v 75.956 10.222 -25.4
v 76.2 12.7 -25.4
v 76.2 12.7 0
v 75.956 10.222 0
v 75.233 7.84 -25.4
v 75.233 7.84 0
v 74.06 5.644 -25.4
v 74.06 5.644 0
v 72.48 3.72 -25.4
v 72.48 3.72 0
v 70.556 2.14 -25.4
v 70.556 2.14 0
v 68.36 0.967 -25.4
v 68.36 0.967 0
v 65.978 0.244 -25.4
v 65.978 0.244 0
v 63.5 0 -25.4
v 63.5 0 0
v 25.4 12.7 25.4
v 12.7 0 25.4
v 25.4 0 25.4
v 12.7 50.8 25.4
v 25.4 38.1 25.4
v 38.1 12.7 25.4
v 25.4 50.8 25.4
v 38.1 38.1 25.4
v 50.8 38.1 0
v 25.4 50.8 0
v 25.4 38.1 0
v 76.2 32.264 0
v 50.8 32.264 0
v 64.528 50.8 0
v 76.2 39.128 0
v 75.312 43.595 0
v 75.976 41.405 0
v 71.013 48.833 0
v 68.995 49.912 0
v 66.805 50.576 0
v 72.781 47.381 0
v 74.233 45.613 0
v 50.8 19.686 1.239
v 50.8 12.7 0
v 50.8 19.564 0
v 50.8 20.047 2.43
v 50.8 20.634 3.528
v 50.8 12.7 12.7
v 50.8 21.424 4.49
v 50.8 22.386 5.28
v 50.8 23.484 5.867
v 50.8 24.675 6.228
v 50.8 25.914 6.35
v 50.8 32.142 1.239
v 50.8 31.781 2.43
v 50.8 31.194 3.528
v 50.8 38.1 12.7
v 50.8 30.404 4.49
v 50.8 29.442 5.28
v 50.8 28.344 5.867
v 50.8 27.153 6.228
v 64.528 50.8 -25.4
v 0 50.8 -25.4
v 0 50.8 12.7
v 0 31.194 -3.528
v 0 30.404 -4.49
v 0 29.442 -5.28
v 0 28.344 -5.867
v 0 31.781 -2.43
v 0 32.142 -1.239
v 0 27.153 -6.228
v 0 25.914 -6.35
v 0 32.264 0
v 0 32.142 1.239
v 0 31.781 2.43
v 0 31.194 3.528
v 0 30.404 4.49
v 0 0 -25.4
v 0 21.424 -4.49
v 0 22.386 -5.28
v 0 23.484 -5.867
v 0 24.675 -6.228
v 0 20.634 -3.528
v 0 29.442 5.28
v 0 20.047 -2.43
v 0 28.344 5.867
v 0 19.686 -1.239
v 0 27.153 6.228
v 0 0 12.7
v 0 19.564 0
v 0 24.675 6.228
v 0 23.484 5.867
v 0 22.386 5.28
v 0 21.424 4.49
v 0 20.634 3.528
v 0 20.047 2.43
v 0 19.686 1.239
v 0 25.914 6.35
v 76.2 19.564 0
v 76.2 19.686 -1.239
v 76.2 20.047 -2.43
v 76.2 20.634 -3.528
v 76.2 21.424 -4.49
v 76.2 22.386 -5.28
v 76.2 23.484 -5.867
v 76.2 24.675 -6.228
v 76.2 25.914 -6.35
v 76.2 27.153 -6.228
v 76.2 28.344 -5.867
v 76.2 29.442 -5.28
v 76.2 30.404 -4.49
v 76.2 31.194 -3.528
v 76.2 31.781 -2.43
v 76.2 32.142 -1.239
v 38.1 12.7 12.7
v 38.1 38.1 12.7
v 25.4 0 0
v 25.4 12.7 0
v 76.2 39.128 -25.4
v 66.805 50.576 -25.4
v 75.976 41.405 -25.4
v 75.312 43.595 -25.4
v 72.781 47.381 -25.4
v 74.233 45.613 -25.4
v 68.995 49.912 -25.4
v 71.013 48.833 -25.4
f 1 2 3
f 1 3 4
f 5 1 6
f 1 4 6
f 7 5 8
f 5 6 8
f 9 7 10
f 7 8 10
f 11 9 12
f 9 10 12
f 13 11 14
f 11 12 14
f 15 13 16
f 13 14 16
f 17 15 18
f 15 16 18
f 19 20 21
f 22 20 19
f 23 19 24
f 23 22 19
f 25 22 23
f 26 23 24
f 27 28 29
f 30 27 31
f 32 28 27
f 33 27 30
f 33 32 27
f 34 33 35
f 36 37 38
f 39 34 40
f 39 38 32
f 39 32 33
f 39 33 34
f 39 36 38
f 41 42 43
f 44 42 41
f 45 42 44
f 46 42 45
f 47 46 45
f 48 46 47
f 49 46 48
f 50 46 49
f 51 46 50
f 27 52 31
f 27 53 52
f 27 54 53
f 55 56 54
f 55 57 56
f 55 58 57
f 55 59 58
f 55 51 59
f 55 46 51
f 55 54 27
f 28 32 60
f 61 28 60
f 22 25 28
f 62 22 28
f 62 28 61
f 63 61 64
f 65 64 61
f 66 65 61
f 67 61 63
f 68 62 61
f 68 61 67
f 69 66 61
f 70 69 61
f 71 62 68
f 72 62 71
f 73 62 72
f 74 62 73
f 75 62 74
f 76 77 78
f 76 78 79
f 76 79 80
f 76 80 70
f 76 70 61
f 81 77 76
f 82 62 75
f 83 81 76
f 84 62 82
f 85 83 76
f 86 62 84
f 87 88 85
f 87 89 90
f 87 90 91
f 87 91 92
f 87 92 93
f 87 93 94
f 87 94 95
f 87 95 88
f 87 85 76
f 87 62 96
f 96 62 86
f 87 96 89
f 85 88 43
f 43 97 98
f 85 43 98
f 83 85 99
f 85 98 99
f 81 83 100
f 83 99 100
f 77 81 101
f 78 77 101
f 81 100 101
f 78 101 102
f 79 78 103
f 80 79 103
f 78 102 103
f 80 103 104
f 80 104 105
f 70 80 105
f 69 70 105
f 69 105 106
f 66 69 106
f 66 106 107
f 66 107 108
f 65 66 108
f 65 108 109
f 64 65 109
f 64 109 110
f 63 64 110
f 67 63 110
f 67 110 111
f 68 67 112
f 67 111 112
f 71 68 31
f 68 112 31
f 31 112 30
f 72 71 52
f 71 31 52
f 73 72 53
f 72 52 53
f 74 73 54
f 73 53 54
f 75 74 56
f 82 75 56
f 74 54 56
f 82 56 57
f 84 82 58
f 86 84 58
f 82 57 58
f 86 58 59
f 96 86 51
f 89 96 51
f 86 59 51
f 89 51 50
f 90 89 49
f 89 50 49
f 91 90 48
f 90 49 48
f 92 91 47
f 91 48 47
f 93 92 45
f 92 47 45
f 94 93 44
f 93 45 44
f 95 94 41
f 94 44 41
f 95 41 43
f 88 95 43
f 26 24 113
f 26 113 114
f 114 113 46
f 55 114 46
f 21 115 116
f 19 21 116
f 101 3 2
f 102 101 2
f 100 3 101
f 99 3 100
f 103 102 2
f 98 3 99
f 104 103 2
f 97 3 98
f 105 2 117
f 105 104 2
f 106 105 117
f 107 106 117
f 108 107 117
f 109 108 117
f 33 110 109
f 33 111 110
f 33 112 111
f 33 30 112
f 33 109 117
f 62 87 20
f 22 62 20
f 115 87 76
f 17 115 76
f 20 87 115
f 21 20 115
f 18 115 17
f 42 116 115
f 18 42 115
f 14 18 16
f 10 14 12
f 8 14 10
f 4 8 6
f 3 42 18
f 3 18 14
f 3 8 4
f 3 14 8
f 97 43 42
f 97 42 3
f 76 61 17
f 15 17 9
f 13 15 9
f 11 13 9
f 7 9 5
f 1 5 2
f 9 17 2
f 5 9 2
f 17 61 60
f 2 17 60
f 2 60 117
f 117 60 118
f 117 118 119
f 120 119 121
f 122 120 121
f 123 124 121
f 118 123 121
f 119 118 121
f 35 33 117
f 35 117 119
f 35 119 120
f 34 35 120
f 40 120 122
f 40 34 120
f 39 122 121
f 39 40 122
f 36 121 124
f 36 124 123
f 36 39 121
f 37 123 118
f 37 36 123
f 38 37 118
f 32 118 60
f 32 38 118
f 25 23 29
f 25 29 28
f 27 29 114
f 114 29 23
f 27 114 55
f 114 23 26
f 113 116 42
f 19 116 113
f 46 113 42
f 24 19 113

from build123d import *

# Parameters (mm, degrees)
F1_DEPTH  = 25.4
F3_DEPTH  = 50.801
F4_W      = 25.4
F4_H      = 12.7
F5_DEPTH  = 25.4
F6_W      = 25.4
F6_H      = 50.8
F7_DEPTH  = 25.4
F8_W      = 12.7
F8_H      = 25.4
F9_DEPTH  = 12.7
F10_DEPTH = 50.801
F12_DEPTH = 76.201


with BuildPart() as f1:
    # F0 (on Top) → F1 (new body, symmetric)
    with BuildSketch(Plane.XY):
        with BuildLine():
            Line((0, 50.8), (0, 0))
            Line((0, 0), (76.2, 0))
            Line((76.2, 0), (76.2, 39.1281142461))
            ThreePointArc((76.2, 39.1281142461), (72.7813838119, 47.3813838119), (64.5281142461, 50.8))
            Line((64.5281142461, 50.8), (0, 50.8))
        make_face()
    extrude(amount=F1_DEPTH, both=True)

    # F2 (on face) → F3 (cut, through all)
    with BuildSketch(Plane.XZ):
        Polygon((12.7, 25.4), (0, 25.4), (0, 12.7), align=None)
    extrude(amount=-F3_DEPTH, mode=Mode.SUBTRACT)

    # F4 (on face) → F5 (cut)
    with BuildSketch(Plane.XY.offset(25.4)):
        with Locations((38.1, 44.45)):
            Rectangle(F4_W, F4_H)
        with Locations((38.1, 6.35)):
            Rectangle(F4_W, F4_H)
    extrude(amount=-F5_DEPTH, mode=Mode.SUBTRACT)

    # F6 (on face) → F7 (cut, through all)
    with BuildSketch(Plane.XY.offset(25.4)):
        with Locations((63.5, 25.4)):
            Rectangle(F6_W, F6_H)
    extrude(amount=-F7_DEPTH, mode=Mode.SUBTRACT)

    # F8 (on face) → F9 (cut)
    with BuildSketch(Plane.XY.offset(25.4)):
        with Locations((44.45, 25.4)):
            Rectangle(F8_W, F8_H)
    extrude(amount=-F9_DEPTH, mode=Mode.SUBTRACT)

    # F4 (on face) → F10 (cut, through all)
    with BuildSketch(Plane.XY.offset(25.4)):
        with BuildLine():
            Line((76.2, 0), (76.2, 12.7))
            ThreePointArc((76.2, 12.7), (72.4802561211, 3.7197438789), (63.5, 0))
            Line((63.5, 0), (76.2, 0))
        make_face()
    extrude(amount=-F10_DEPTH, mode=Mode.SUBTRACT)

    # F11 (on face) → F12 (cut, through all)
    with BuildSketch(Plane.YZ.offset(76.2)):
        with BuildLine():
            Line((19.564057123, 0), (32.264057123, 0))
            ThreePointArc((32.264057123, 0), (25.914057123, 6.35), (19.564057123, 0))
        make_face()
        with BuildLine():
            ThreePointArc((19.564057123, 0), (25.914057123, -6.35), (32.264057123, 0))
            Line((32.264057123, 0), (19.564057123, 0))
        make_face()
    extrude(amount=-F12_DEPTH, mode=Mode.SUBTRACT)


solid = f1.part
